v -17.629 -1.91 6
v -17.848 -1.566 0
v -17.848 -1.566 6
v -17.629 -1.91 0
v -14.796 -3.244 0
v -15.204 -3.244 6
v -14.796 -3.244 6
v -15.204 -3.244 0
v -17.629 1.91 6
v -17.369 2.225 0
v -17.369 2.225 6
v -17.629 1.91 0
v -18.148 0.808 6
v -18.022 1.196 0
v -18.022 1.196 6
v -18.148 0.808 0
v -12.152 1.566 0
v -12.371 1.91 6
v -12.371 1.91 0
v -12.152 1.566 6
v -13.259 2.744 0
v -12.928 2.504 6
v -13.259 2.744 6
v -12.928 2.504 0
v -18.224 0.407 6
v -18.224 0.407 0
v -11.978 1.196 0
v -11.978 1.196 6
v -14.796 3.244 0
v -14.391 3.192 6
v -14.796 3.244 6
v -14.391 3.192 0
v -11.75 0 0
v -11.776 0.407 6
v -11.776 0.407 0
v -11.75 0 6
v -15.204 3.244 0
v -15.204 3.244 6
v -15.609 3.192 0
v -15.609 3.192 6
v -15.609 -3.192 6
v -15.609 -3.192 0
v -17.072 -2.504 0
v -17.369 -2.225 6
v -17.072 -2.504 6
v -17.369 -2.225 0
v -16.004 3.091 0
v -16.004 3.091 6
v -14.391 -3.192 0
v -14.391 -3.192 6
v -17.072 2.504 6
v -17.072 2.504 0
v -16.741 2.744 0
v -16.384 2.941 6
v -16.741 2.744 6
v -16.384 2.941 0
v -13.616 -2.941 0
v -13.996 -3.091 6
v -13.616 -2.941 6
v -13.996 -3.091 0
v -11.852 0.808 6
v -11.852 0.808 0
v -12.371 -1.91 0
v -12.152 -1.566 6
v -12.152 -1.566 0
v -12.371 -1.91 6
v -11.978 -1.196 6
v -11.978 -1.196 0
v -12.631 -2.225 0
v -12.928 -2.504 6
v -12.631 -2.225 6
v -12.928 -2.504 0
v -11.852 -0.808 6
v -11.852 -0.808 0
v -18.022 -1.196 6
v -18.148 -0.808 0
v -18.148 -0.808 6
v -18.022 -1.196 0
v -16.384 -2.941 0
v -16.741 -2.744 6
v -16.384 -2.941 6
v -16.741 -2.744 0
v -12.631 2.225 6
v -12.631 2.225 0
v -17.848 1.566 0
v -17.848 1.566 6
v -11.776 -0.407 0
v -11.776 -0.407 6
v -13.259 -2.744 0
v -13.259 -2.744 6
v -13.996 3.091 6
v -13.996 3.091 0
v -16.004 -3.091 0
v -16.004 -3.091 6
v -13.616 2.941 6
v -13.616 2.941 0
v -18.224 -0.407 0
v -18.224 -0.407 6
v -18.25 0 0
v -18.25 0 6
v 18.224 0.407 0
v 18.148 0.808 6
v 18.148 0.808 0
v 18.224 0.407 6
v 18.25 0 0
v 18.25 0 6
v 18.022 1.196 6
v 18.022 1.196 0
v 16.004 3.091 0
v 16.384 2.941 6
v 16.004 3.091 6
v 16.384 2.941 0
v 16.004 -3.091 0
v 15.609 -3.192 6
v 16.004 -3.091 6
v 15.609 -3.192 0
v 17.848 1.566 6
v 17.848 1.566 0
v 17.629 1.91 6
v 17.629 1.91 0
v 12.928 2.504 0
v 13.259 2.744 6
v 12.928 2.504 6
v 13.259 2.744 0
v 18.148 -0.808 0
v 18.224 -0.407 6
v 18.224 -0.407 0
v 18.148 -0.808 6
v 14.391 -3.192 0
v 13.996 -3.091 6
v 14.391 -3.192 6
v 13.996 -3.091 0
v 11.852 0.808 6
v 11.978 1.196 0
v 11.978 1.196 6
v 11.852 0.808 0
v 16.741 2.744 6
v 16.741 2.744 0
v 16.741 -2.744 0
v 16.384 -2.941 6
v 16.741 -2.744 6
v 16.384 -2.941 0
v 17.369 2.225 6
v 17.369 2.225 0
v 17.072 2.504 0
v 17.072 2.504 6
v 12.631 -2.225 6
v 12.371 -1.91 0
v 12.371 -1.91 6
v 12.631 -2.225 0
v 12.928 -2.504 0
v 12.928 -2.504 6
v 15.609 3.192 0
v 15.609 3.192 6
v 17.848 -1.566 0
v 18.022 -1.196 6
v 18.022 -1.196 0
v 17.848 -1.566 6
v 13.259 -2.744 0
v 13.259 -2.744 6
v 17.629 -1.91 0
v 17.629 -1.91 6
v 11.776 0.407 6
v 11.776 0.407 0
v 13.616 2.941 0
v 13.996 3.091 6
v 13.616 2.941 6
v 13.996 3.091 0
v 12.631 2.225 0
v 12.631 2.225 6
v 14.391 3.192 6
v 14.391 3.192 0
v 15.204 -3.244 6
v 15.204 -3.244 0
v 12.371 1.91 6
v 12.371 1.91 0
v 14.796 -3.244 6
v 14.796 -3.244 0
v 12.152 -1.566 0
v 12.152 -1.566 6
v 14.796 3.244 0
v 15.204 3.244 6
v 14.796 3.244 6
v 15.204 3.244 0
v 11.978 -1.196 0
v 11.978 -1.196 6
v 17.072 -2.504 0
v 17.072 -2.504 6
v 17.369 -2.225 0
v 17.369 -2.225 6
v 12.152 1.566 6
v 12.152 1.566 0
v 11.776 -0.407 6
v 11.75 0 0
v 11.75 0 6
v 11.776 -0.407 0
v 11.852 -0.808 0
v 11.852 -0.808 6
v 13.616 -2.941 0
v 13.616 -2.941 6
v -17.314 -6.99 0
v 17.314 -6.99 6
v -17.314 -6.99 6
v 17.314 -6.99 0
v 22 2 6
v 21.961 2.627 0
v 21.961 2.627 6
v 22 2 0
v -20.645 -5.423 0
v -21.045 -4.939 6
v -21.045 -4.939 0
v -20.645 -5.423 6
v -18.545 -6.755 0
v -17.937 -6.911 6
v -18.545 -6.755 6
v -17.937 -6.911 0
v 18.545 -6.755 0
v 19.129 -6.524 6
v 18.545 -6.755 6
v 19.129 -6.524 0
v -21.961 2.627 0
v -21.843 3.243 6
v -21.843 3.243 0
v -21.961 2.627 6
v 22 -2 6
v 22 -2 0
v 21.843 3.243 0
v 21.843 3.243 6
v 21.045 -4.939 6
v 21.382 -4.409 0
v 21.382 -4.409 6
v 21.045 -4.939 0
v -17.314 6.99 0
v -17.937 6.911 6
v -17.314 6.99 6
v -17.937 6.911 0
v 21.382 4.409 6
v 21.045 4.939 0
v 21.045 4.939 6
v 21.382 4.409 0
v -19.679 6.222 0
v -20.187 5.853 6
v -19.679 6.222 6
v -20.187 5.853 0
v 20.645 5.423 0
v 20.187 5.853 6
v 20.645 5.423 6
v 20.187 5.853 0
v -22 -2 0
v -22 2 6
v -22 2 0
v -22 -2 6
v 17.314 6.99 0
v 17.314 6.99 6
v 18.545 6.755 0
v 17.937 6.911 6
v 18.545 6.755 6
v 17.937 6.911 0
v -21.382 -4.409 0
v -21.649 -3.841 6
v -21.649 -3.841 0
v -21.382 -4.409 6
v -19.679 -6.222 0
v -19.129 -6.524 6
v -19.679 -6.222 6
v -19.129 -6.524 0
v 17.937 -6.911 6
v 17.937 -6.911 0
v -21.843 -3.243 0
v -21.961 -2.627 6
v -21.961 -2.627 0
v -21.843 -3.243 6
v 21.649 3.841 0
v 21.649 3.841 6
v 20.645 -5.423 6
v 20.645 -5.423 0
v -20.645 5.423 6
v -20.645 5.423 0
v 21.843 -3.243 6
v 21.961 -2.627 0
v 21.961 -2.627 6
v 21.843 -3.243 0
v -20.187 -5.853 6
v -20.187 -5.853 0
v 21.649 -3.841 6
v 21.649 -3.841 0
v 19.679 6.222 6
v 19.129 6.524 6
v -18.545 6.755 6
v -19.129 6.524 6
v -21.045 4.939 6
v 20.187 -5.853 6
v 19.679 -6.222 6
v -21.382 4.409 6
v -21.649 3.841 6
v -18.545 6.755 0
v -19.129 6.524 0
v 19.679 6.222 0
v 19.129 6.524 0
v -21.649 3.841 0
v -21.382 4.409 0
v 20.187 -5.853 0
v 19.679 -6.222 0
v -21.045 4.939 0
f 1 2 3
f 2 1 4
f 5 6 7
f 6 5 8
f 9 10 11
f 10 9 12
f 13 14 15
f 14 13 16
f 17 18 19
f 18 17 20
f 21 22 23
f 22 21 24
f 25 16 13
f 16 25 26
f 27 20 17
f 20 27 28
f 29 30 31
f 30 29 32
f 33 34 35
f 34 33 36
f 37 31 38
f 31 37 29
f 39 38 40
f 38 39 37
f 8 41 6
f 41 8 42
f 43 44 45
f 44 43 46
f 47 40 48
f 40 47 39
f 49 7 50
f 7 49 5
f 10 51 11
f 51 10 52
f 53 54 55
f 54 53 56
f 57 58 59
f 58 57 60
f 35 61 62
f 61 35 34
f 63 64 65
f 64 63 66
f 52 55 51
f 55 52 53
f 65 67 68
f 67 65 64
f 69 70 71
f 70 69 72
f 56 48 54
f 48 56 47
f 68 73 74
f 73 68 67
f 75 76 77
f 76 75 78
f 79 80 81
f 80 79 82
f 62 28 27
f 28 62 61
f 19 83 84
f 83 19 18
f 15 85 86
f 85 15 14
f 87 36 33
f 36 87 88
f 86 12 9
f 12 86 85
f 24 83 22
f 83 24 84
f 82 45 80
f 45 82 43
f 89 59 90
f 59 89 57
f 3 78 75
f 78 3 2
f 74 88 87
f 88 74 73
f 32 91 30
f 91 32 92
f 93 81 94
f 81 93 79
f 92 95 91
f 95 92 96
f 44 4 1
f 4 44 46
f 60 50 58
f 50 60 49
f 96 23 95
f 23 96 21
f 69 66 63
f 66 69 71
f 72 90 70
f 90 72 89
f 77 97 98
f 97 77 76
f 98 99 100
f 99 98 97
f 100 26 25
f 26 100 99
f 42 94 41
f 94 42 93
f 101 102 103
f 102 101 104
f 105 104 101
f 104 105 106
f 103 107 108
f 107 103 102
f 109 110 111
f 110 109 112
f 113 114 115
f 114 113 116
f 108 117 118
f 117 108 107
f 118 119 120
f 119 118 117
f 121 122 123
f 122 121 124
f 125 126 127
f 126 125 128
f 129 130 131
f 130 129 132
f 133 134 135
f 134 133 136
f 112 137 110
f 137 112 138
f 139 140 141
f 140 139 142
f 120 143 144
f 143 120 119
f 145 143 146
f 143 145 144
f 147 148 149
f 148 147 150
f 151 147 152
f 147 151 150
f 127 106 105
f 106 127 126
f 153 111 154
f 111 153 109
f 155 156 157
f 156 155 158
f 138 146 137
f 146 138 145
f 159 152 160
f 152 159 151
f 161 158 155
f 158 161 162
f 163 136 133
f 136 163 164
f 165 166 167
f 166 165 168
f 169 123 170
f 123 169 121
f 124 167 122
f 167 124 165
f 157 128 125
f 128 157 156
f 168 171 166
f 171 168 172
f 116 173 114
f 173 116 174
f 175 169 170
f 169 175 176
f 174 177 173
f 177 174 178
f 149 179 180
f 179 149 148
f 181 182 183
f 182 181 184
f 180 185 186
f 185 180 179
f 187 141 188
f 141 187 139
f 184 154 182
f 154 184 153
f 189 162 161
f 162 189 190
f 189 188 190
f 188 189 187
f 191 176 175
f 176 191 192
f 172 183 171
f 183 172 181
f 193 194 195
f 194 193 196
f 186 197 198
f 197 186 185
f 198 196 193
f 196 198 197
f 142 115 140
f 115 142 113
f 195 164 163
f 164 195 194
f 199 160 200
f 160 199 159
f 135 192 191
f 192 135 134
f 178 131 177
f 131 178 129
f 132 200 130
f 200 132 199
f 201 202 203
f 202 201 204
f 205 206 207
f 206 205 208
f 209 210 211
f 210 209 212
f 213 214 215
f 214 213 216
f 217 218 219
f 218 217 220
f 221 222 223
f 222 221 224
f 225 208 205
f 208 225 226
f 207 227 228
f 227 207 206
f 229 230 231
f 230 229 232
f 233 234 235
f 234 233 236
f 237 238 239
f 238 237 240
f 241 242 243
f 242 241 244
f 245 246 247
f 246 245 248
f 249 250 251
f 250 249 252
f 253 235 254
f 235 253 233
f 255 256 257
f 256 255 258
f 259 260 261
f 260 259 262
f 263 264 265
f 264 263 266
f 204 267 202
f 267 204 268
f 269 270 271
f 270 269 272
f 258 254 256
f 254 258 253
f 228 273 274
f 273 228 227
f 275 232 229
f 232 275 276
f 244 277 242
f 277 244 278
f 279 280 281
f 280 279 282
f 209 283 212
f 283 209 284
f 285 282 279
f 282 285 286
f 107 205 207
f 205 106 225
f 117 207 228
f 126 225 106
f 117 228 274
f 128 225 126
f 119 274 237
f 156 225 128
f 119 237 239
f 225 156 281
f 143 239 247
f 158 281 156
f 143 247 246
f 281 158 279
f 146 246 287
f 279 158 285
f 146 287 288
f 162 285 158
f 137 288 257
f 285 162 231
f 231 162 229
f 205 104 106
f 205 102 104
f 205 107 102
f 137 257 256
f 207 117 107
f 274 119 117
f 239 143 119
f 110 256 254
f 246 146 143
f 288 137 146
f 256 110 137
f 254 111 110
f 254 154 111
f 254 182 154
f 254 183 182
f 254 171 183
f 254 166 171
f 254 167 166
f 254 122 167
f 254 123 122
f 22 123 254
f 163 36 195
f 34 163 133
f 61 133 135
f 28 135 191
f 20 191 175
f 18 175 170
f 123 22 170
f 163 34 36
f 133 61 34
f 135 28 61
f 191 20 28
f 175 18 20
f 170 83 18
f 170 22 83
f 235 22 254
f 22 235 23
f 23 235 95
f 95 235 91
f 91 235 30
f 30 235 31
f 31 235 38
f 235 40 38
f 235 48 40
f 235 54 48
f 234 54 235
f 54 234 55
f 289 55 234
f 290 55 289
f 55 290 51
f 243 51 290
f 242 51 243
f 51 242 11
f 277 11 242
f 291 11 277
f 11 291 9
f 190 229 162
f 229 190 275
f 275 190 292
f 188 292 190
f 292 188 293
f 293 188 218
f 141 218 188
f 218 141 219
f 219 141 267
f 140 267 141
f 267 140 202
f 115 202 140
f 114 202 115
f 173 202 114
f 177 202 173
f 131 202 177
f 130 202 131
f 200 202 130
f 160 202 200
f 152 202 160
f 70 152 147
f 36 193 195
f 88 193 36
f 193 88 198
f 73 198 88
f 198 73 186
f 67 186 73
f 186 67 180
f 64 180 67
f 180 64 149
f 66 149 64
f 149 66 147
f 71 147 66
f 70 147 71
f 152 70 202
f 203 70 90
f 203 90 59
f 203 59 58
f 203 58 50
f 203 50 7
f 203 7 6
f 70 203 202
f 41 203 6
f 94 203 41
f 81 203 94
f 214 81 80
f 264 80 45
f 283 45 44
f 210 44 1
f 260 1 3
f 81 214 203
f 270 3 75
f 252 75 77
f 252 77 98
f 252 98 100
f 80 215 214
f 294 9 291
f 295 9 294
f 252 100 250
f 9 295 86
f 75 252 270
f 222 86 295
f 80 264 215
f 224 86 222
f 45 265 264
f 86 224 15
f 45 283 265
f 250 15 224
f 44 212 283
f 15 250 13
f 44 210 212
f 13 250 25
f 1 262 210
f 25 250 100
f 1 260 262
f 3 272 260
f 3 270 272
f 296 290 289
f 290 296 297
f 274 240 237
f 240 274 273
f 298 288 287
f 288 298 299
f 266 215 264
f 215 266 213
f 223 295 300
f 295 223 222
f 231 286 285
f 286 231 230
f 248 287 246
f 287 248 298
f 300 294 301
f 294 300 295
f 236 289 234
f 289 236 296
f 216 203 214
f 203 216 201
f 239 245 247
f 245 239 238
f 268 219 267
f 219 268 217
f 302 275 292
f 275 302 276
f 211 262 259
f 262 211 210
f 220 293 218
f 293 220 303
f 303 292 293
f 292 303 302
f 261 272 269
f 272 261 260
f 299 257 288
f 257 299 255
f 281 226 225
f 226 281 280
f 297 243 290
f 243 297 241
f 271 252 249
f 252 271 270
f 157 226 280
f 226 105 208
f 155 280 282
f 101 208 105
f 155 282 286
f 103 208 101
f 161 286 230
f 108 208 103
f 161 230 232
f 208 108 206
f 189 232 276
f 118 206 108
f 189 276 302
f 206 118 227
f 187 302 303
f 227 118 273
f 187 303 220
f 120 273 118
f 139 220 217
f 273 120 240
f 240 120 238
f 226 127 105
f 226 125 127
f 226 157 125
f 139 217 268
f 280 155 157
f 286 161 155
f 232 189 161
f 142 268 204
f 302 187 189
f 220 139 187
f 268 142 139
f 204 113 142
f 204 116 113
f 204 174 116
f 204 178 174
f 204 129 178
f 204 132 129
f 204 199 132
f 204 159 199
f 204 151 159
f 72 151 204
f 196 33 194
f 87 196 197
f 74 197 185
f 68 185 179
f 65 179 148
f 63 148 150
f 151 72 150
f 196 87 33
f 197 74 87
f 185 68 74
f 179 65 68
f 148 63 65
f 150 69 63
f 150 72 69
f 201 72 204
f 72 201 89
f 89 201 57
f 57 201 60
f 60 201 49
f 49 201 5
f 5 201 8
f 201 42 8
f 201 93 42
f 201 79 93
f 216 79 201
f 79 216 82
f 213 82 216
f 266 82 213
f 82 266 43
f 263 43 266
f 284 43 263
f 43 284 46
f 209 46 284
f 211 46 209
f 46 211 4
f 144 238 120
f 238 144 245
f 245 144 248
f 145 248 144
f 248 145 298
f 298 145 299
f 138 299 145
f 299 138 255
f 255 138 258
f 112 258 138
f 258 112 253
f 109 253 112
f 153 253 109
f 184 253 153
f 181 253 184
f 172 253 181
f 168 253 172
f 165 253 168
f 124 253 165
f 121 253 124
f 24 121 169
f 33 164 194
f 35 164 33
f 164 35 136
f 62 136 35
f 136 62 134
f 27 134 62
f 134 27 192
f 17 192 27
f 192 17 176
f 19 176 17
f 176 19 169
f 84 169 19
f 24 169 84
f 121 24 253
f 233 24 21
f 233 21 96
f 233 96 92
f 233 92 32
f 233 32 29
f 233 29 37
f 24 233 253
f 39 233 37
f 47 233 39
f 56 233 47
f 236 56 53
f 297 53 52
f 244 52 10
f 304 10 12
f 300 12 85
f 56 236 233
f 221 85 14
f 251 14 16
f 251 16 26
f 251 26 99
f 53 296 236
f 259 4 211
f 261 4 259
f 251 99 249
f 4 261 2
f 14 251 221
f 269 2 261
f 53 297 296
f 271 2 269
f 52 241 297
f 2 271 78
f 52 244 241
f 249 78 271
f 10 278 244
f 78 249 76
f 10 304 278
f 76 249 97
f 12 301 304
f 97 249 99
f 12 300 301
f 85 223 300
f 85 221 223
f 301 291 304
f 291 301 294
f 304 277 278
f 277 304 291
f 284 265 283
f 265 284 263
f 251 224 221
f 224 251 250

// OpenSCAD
$fn = 50;


difference() {
	union() {
		hull() {
			translate(v = [-17.0000000000, 2.0000000000, 0]) {
				cylinder(h = 6, r = 5);
			}
			translate(v = [17.0000000000, 2.0000000000, 0]) {
				cylinder(h = 6, r = 5);
			}
			translate(v = [-17.0000000000, -2.0000000000, 0]) {
				cylinder(h = 6, r = 5);
			}
			translate(v = [17.0000000000, -2.0000000000, 0]) {
				cylinder(h = 6, r = 5);
			}
		}
	}
	union() {
		translate(v = [-15.0000000000, 0.0000000000, -100.0000000000]) {
			cylinder(h = 200, r = 3.2500000000);
		}
		translate(v = [-15.0000000000, 0.0000000000, -100.0000000000]) {
			cylinder(h = 200, r = 3.2500000000);
		}
		translate(v = [15.0000000000, 0.0000000000, -100.0000000000]) {
			cylinder(h = 200, r = 3.2500000000);
		}
		translate(v = [15.0000000000, 0.0000000000, -100.0000000000]) {
			cylinder(h = 200, r = 3.2500000000);
		}
	}
}
